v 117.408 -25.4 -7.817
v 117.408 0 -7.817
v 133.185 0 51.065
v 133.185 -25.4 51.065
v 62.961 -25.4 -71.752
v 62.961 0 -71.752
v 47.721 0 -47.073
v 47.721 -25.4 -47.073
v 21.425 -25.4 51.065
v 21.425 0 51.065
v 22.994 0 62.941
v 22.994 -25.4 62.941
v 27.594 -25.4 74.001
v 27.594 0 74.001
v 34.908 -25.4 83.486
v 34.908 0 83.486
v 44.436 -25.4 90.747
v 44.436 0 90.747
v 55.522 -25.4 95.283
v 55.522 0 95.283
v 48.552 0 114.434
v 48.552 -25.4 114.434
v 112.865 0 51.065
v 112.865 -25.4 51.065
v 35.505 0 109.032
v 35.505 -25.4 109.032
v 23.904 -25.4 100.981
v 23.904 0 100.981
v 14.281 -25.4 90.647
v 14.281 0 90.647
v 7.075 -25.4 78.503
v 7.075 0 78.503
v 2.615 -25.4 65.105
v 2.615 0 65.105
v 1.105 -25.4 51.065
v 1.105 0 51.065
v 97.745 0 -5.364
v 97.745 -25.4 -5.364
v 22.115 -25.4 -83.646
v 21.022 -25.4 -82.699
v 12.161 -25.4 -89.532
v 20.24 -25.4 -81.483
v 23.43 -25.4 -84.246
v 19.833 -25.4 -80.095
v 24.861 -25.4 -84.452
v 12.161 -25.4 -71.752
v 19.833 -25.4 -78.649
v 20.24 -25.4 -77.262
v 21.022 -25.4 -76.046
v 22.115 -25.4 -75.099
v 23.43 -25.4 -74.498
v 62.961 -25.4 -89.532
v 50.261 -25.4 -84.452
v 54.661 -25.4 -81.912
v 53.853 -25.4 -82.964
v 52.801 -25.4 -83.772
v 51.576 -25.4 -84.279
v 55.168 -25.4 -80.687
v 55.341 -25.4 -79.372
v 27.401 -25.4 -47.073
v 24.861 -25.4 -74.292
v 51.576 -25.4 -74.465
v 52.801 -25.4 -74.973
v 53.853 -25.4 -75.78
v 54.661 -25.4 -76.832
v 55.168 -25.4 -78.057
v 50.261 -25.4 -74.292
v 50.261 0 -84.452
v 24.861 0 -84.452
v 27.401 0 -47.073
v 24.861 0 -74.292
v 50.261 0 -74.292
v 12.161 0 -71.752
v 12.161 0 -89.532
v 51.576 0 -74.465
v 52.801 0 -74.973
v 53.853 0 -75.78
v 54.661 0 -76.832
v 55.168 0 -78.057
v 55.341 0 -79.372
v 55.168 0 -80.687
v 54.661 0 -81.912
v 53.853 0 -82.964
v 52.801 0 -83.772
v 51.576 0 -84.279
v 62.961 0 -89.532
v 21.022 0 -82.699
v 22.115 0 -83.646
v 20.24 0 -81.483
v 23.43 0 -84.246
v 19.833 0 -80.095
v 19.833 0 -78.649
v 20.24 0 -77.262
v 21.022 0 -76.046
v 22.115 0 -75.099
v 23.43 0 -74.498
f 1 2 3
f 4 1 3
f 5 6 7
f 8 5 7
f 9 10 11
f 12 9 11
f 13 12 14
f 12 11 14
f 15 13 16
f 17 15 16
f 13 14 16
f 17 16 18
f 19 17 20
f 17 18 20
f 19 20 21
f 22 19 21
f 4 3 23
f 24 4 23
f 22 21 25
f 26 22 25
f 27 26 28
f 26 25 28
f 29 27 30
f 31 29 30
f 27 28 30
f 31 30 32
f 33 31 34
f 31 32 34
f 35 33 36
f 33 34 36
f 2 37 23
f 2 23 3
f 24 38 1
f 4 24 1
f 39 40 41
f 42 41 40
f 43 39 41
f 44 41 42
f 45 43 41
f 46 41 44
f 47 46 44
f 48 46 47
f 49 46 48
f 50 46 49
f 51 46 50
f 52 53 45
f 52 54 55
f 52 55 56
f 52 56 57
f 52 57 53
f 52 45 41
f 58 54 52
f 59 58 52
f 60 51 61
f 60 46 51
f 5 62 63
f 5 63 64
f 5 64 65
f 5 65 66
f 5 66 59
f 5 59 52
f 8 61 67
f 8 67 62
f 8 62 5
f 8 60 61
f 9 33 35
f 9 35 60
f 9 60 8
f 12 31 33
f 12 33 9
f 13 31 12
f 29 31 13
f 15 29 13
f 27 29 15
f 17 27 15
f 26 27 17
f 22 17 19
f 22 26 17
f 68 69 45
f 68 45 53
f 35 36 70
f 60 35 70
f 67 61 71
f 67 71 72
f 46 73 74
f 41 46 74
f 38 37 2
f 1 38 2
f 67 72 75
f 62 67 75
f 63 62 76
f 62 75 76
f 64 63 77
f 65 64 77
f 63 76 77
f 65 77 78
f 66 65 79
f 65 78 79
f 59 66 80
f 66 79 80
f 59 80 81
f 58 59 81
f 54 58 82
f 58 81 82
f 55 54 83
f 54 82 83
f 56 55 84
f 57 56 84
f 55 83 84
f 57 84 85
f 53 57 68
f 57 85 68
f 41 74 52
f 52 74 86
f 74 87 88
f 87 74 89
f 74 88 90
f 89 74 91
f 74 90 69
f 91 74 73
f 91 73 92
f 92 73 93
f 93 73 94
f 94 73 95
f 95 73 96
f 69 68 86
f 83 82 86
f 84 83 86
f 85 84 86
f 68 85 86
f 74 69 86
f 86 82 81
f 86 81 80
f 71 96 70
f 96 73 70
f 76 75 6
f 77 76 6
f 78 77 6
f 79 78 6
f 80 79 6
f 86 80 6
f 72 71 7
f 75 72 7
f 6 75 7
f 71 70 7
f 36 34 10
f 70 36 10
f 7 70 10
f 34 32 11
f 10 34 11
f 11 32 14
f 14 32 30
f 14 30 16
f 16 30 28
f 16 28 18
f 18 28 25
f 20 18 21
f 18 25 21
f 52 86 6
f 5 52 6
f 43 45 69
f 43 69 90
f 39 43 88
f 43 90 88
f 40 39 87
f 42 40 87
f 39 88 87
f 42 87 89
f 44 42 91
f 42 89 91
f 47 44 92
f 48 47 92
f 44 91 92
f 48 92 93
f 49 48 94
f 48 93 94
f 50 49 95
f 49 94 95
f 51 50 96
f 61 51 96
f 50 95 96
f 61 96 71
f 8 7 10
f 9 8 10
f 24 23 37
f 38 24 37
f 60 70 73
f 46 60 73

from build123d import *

# Parameters (mm, degrees)
F0_W     = 25.4
F0_H     = 5.08
F1_DEPTH = 25.4


with BuildPart() as f1:
    # F0 (on Front) → F1 (new body)
    with BuildSketch(Plane.XZ):
        with BuildLine():
            ThreePointArc((48.551648, 114.433848), (14.281163, 90.646732), (1.105111, 51.065364))
            Line((1.105111, 51.065364), (21.425111, 51.065364))
            ThreePointArc((21.425111, 51.065364), (30.939231, 78.984044), (55.521903, 95.283228))
            Line((55.521903, 95.283228), (48.551648, 114.433848))
        make_face()
        Polygon((133.185111, 51.065364), (112.865111, 51.065364), (97.744902, -5.364023), (117.407502, -7.817474), align=None)
        Polygon((1.105111, 51.065364), (27.401126, -47.0727), (47.721126, -47.0727), (21.425111, 51.065364), align=None)
        Polygon((47.721126, -47.0727), (27.401126, -47.0727), (12.161126, -71.752195), (24.861126, -71.752195), (34.013976, -71.752195), (50.261126, -71.752195), (54.333976, -71.752195), (62.961126, -71.752195), align=None)
        with BuildLine():
            Line((24.861126, -71.752195), (12.161126, -71.752195))
            Line((12.161126, -71.752195), (12.161126, -89.532195))
            Line((12.161126, -89.532195), (24.861126, -89.532195))
            Line((24.861126, -89.532195), (24.861126, -84.452195))
            ThreePointArc((24.861126, -84.452195), (19.781126, -79.372195), (24.861126, -74.292195))
            Line((24.861126, -74.292195), (24.861126, -71.752195))
        make_face()
        with Locations((37.561126, -86.992195)):
            Rectangle(F0_W, F0_H)
        with BuildLine():
            Line((62.961126, -89.532195), (62.961126, -71.752195))
            Line((62.961126, -71.752195), (54.333976, -71.752195))
            Line((54.333976, -71.752195), (50.261126, -71.752195))
            Line((50.261126, -71.752195), (50.261126, -74.292195))
            ThreePointArc((50.261126, -74.292195), (53.853228, -75.780093), (55.341126, -79.372195))
            ThreePointArc((55.341126, -79.372195), (53.853228, -82.964298), (50.261126, -84.452195))
            Line((50.261126, -84.452195), (50.261126, -89.532195))
            Line((50.261126, -89.532195), (62.961126, -89.532195))
        make_face()
        Polygon((34.013976, -71.752195), (24.861126, -71.752195), (24.861126, -74.292195), (50.261126, -74.292195), (50.261126, -71.752195), align=None)
    extrude(amount=F1_DEPTH)


solid = f1.part
